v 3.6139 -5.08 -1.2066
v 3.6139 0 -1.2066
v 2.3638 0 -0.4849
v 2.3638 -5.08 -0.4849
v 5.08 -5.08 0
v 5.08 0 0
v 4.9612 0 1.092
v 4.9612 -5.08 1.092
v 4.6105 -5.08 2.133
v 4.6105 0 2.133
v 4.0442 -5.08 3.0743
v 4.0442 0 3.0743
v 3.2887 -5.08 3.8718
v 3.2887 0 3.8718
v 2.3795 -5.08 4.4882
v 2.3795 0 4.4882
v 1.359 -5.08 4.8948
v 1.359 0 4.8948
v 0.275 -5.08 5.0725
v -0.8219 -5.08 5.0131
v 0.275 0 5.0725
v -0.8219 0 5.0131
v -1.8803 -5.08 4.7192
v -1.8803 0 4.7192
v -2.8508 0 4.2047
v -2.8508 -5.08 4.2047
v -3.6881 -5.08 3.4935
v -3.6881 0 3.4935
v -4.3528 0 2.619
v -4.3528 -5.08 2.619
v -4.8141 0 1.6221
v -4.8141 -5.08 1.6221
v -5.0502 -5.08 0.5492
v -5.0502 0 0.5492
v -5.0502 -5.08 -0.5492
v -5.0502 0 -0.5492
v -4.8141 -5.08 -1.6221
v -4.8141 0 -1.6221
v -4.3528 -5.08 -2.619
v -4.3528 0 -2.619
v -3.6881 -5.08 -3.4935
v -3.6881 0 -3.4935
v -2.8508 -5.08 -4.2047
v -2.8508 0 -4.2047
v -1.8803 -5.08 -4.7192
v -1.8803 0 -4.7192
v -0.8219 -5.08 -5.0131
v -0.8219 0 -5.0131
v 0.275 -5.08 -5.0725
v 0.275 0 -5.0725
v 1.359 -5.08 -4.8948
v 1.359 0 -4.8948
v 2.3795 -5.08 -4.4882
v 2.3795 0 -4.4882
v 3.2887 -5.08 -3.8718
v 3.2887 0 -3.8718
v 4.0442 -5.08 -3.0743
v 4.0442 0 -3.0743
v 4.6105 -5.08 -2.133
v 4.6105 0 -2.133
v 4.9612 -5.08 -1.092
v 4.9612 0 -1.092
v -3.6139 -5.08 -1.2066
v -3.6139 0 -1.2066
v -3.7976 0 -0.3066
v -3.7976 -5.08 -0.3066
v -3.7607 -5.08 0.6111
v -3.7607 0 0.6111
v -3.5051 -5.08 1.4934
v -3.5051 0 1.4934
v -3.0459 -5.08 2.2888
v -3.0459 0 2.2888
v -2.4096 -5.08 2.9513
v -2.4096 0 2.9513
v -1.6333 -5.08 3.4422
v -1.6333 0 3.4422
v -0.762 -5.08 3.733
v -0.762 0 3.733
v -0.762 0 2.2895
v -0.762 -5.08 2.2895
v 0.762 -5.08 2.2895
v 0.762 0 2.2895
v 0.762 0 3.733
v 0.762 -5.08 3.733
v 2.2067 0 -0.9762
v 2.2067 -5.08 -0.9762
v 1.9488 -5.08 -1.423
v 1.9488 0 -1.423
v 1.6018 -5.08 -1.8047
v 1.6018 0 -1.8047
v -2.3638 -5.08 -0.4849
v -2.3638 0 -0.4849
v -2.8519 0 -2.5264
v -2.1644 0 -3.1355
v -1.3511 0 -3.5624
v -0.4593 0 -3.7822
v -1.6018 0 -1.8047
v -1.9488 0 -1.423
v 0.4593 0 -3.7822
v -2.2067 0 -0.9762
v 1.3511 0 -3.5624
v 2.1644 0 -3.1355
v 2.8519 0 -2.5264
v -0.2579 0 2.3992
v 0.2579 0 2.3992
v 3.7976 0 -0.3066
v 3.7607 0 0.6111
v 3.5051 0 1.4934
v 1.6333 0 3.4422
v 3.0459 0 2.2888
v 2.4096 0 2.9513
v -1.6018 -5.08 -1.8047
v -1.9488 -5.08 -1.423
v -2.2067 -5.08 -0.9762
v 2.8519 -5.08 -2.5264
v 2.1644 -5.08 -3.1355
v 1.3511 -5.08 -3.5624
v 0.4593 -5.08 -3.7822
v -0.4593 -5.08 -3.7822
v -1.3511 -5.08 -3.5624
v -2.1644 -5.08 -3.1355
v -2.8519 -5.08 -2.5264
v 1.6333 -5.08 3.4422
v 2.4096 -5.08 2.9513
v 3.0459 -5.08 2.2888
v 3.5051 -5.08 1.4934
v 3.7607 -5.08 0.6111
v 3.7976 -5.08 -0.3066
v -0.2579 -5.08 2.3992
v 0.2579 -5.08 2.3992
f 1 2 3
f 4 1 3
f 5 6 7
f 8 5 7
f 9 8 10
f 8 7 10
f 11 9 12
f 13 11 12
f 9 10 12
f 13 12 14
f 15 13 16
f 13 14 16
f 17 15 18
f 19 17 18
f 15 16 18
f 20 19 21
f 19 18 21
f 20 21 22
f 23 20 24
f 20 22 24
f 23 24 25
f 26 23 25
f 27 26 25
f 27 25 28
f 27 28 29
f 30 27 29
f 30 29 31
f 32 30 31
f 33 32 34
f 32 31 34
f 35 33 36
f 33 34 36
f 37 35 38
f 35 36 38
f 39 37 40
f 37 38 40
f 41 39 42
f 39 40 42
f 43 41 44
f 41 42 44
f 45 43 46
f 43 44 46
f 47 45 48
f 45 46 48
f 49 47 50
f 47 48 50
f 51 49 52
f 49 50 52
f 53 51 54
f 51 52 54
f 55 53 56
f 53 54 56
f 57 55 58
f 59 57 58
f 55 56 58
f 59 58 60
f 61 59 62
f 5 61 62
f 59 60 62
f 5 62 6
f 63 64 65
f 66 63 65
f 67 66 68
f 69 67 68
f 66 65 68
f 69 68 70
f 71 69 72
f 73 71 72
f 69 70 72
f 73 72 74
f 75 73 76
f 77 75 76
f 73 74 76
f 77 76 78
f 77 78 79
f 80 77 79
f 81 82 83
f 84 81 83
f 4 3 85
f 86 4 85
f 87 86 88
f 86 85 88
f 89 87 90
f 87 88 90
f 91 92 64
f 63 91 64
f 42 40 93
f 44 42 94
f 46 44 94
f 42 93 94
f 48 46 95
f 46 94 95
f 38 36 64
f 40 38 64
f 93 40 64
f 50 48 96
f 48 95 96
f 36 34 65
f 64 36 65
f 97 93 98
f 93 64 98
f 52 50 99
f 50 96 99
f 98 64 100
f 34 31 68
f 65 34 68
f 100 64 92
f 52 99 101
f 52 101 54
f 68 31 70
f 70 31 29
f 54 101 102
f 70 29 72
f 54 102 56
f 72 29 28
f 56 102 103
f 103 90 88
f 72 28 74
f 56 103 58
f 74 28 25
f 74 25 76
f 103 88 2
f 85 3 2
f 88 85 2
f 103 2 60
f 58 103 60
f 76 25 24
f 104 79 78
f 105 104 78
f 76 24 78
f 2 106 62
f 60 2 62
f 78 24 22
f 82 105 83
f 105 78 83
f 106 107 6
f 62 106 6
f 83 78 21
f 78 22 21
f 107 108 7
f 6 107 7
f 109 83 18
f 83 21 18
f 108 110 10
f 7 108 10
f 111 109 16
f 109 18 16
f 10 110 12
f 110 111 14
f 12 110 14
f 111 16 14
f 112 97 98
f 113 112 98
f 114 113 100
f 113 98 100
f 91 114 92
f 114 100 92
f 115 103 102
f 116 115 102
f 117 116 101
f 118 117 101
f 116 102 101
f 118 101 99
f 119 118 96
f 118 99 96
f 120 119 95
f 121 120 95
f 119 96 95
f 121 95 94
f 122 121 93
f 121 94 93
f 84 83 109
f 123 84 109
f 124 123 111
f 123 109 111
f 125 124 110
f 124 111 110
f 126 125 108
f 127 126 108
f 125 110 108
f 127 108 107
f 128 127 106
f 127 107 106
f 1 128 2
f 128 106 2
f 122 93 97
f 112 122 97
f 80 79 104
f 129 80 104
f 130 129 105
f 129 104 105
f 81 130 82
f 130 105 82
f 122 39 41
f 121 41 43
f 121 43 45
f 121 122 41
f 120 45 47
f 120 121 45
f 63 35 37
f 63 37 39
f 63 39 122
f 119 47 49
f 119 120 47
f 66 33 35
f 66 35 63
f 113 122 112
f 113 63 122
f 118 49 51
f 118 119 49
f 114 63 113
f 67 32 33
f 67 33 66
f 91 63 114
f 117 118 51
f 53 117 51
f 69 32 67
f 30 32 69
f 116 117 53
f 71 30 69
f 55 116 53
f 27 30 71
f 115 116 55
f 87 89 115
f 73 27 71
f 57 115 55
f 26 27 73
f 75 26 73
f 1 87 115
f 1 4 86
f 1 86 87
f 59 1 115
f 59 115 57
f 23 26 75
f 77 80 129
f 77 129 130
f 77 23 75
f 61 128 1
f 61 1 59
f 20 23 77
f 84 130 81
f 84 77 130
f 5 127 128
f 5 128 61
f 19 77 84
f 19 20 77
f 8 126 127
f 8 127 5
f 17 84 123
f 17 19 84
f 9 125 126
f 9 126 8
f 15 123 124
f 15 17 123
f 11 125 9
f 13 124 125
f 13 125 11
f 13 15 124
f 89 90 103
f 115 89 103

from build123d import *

# Parameters (mm, degrees)
F0_R     = 5.08
F1_DEPTH = 5.08


with BuildPart() as f1:
    # F0 (on Front) → F1 (new body)
    with BuildSketch(Plane.XZ):
        Circle(F0_R)
        with BuildLine():
            ThreePointArc((-0.762, 2.289525), (0, 2.413), (0.762, 2.289525))
            Line((0.762, 2.289525), (0.762, 3.733022))
            ThreePointArc((0.762, 3.733022), (3.299557, 1.905), (3.613892, -1.2066))
            Line((3.613892, -1.2066), (2.363787, -0.484851))
            ThreePointArc((2.363787, -0.484851), (2.089719, -1.2065), (1.601787, -1.804674))
            Line((1.601787, -1.804674), (2.851892, -2.526423))
            ThreePointArc((2.851892, -2.526423), (0, -3.81), (-2.851892, -2.526423))
            Line((-2.851892, -2.526423), (-1.601787, -1.804674))
            ThreePointArc((-1.601787, -1.804674), (-2.089719, -1.2065), (-2.363787, -0.484851))
            Line((-2.363787, -0.484851), (-3.613892, -1.2066))
            ThreePointArc((-3.613892, -1.2066), (-3.299557, 1.905), (-0.762, 3.733022))
            Line((-0.762, 3.733022), (-0.762, 2.289525))
        make_face(mode=Mode.SUBTRACT)
    extrude(amount=F1_DEPTH)


solid = f1.part
